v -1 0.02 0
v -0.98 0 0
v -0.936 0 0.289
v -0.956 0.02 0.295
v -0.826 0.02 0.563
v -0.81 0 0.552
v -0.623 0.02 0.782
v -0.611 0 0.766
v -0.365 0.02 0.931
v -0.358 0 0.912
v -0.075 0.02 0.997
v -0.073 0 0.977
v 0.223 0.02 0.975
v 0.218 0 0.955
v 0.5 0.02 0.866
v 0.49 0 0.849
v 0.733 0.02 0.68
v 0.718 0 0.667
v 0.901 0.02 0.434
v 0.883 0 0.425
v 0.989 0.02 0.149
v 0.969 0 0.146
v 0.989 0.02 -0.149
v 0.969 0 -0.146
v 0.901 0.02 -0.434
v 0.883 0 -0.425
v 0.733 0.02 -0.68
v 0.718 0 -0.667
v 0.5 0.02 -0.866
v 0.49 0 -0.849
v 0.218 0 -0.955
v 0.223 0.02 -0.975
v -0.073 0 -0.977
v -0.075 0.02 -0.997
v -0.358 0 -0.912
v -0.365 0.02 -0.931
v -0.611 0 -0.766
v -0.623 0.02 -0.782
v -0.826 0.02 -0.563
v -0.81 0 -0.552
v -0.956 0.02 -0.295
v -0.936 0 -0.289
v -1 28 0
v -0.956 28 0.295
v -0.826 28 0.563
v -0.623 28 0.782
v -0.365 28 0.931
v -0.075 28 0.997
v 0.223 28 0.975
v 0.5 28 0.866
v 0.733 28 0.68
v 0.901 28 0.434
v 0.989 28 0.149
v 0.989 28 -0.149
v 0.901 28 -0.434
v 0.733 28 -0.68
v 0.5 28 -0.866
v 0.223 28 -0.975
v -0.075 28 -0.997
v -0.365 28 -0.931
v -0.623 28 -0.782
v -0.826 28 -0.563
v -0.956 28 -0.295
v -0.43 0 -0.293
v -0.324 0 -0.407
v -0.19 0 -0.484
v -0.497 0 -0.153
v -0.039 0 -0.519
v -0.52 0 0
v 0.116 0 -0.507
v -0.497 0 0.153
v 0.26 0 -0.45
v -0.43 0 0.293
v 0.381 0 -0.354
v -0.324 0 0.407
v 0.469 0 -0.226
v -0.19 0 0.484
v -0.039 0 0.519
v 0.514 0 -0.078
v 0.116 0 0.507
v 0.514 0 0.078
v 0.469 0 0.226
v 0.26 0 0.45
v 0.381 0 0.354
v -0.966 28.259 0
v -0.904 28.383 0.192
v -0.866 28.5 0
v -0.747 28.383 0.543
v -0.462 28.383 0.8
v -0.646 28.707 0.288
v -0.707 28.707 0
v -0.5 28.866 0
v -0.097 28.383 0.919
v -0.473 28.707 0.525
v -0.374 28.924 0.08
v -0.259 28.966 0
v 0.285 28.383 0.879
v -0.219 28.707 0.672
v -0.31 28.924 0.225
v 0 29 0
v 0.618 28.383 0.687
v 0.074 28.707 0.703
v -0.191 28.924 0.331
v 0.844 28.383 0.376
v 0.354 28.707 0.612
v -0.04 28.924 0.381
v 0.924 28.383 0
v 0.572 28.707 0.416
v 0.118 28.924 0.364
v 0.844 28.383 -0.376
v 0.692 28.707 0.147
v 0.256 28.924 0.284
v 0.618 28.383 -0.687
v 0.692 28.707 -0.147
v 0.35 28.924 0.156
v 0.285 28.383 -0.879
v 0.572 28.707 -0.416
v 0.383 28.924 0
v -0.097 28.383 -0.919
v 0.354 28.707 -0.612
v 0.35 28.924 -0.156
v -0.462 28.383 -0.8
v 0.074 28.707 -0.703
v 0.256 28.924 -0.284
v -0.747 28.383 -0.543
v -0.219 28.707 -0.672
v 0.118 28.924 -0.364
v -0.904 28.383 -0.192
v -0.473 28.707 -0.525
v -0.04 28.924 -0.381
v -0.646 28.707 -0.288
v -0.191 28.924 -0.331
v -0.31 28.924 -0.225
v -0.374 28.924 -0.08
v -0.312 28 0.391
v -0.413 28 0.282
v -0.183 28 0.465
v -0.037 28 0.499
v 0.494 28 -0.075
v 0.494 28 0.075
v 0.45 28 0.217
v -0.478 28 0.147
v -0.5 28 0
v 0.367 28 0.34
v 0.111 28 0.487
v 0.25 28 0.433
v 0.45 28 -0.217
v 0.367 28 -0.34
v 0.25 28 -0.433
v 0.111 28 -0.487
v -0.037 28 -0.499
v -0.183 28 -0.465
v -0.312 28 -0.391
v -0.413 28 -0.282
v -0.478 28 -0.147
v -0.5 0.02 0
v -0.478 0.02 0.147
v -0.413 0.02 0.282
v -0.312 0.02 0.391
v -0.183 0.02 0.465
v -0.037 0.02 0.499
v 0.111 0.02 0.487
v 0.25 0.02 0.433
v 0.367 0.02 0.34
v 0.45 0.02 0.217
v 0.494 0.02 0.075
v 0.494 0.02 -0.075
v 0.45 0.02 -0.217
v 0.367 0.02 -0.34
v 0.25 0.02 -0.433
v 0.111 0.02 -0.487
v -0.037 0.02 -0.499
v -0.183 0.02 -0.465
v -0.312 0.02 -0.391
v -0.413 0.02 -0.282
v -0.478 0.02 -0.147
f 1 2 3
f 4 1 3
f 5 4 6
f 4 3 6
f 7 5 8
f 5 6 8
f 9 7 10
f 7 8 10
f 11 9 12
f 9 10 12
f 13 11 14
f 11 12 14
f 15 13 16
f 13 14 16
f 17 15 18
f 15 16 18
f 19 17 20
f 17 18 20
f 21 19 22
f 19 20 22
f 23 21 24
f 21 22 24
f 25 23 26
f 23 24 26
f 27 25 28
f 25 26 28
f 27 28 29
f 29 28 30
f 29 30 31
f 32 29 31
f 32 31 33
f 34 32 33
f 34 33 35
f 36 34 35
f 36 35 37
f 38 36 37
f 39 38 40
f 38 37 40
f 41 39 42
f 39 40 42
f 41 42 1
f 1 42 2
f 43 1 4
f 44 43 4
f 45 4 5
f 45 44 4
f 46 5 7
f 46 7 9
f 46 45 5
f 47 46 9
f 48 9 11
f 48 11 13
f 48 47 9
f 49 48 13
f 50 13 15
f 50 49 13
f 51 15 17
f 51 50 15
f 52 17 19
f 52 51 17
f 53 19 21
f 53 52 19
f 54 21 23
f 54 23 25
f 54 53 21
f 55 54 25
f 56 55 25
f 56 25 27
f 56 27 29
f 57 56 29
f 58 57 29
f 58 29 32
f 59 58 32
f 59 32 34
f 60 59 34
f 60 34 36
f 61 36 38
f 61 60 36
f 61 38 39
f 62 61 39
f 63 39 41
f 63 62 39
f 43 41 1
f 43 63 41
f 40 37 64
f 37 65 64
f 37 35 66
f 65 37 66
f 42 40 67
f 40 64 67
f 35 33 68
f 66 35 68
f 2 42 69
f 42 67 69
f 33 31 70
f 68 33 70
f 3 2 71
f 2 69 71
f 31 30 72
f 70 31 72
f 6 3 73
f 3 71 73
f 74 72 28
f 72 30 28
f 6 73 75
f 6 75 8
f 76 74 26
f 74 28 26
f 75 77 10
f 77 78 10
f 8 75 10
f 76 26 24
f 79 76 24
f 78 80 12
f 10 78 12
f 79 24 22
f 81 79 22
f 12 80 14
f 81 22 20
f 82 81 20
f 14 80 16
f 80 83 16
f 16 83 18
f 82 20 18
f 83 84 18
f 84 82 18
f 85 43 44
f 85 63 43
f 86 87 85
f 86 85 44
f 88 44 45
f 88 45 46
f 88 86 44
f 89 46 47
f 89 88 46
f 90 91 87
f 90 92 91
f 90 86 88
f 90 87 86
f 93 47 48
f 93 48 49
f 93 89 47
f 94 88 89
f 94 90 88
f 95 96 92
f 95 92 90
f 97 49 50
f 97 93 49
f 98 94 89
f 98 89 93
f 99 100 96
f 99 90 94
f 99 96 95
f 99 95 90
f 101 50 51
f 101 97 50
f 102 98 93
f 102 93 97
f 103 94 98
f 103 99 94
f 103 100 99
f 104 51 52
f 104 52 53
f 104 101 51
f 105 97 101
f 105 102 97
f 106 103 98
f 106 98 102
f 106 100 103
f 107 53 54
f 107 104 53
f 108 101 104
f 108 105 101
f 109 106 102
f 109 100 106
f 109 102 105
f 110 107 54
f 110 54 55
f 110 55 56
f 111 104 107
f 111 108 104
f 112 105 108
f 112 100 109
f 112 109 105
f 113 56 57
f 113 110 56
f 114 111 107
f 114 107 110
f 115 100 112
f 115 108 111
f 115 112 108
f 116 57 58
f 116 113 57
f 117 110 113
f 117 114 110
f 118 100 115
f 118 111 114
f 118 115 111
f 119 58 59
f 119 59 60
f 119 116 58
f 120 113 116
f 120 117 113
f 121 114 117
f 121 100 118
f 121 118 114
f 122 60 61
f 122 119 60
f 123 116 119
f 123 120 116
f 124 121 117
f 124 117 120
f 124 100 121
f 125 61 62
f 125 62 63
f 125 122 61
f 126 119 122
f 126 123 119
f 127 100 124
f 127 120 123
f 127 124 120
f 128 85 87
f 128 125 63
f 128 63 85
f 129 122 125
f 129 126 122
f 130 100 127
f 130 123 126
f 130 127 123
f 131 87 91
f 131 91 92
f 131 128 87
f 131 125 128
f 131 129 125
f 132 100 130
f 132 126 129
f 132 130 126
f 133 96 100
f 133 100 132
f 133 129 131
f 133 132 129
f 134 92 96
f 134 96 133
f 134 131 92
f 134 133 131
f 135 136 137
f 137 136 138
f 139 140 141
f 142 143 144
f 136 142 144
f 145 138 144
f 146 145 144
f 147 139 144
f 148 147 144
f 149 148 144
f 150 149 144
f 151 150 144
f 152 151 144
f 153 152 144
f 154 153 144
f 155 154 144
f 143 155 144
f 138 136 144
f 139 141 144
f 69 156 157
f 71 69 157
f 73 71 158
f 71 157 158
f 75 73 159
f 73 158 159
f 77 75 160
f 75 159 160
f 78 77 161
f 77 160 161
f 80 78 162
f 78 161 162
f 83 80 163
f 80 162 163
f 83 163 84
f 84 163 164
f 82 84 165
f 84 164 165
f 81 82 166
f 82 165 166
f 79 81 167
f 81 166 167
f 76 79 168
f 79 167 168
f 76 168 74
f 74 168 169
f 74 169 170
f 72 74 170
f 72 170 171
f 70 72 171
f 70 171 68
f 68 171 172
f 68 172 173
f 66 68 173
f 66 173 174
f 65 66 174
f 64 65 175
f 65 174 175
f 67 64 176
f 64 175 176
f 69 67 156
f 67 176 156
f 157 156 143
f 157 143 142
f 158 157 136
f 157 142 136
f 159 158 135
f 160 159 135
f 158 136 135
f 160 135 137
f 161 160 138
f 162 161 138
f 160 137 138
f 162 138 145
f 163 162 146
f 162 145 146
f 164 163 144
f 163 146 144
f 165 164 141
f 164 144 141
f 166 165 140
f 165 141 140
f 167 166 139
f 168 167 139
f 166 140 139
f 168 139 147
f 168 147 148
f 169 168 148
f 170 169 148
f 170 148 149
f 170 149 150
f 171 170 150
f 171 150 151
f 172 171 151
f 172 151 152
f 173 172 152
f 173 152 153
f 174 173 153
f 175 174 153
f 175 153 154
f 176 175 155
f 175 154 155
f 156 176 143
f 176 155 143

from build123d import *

# Parameters (mm, degrees)
THICKEN1_T2   = 0.5
CHAMFER1_SIZE = 0.02
CHAMFER2_SIZE = 0.02


with BuildPart() as body_1:
    # Surface-Revolve1: a surface, the sketch's curves turned about an axis
    with BuildLine(Plane.XY, mode=Mode.PRIVATE) as surface_revolve1_1_path:
        Line((-1, 0), (-1, 28))
        ThreePointArc((-1, 28), (-0.707106781, 28.707106781), (0, 29))
    surface_revolve1_1 = Shell.revolve(surface_revolve1_1_path.wire(), 360, Axis((0, 0, 0), (0, 1, 0)))
    add(Solid.thicken(surface_revolve1_1, -THICKEN1_T2))

    # Chamfer1
    chamfer1_edges = [body_1.edges().sort_by_distance(p)[0] for p in [
        (1, 0, 0),
    ]]
    chamfer(chamfer1_edges, length=CHAMFER1_SIZE)

    # Chamfer2
    chamfer2_edges = [body_1.edges().sort_by_distance(p)[0] for p in [
        (0.5, 0, 0),
    ]]
    chamfer(chamfer2_edges, length=CHAMFER2_SIZE)

    # Sketch4 → Revolve2 (revolve)
    with BuildSketch(Plane.XY, mode=Mode.PRIVATE) as revolve2_sk:
        with BuildLine():
            Line((-1, 28), (0, 28))
            Line((0, 28), (0, 29))
            ThreePointArc((0, 29), (-0.707106781, 28.707106781), (-1, 28))
        make_face()
    revolve(revolve2_sk.sketch.rotate(Axis((0, 0, 0), (0, 1, 0)), 90), axis=Axis((0, 0, 0), (0, 1, 0)))


solid = body_1.part
